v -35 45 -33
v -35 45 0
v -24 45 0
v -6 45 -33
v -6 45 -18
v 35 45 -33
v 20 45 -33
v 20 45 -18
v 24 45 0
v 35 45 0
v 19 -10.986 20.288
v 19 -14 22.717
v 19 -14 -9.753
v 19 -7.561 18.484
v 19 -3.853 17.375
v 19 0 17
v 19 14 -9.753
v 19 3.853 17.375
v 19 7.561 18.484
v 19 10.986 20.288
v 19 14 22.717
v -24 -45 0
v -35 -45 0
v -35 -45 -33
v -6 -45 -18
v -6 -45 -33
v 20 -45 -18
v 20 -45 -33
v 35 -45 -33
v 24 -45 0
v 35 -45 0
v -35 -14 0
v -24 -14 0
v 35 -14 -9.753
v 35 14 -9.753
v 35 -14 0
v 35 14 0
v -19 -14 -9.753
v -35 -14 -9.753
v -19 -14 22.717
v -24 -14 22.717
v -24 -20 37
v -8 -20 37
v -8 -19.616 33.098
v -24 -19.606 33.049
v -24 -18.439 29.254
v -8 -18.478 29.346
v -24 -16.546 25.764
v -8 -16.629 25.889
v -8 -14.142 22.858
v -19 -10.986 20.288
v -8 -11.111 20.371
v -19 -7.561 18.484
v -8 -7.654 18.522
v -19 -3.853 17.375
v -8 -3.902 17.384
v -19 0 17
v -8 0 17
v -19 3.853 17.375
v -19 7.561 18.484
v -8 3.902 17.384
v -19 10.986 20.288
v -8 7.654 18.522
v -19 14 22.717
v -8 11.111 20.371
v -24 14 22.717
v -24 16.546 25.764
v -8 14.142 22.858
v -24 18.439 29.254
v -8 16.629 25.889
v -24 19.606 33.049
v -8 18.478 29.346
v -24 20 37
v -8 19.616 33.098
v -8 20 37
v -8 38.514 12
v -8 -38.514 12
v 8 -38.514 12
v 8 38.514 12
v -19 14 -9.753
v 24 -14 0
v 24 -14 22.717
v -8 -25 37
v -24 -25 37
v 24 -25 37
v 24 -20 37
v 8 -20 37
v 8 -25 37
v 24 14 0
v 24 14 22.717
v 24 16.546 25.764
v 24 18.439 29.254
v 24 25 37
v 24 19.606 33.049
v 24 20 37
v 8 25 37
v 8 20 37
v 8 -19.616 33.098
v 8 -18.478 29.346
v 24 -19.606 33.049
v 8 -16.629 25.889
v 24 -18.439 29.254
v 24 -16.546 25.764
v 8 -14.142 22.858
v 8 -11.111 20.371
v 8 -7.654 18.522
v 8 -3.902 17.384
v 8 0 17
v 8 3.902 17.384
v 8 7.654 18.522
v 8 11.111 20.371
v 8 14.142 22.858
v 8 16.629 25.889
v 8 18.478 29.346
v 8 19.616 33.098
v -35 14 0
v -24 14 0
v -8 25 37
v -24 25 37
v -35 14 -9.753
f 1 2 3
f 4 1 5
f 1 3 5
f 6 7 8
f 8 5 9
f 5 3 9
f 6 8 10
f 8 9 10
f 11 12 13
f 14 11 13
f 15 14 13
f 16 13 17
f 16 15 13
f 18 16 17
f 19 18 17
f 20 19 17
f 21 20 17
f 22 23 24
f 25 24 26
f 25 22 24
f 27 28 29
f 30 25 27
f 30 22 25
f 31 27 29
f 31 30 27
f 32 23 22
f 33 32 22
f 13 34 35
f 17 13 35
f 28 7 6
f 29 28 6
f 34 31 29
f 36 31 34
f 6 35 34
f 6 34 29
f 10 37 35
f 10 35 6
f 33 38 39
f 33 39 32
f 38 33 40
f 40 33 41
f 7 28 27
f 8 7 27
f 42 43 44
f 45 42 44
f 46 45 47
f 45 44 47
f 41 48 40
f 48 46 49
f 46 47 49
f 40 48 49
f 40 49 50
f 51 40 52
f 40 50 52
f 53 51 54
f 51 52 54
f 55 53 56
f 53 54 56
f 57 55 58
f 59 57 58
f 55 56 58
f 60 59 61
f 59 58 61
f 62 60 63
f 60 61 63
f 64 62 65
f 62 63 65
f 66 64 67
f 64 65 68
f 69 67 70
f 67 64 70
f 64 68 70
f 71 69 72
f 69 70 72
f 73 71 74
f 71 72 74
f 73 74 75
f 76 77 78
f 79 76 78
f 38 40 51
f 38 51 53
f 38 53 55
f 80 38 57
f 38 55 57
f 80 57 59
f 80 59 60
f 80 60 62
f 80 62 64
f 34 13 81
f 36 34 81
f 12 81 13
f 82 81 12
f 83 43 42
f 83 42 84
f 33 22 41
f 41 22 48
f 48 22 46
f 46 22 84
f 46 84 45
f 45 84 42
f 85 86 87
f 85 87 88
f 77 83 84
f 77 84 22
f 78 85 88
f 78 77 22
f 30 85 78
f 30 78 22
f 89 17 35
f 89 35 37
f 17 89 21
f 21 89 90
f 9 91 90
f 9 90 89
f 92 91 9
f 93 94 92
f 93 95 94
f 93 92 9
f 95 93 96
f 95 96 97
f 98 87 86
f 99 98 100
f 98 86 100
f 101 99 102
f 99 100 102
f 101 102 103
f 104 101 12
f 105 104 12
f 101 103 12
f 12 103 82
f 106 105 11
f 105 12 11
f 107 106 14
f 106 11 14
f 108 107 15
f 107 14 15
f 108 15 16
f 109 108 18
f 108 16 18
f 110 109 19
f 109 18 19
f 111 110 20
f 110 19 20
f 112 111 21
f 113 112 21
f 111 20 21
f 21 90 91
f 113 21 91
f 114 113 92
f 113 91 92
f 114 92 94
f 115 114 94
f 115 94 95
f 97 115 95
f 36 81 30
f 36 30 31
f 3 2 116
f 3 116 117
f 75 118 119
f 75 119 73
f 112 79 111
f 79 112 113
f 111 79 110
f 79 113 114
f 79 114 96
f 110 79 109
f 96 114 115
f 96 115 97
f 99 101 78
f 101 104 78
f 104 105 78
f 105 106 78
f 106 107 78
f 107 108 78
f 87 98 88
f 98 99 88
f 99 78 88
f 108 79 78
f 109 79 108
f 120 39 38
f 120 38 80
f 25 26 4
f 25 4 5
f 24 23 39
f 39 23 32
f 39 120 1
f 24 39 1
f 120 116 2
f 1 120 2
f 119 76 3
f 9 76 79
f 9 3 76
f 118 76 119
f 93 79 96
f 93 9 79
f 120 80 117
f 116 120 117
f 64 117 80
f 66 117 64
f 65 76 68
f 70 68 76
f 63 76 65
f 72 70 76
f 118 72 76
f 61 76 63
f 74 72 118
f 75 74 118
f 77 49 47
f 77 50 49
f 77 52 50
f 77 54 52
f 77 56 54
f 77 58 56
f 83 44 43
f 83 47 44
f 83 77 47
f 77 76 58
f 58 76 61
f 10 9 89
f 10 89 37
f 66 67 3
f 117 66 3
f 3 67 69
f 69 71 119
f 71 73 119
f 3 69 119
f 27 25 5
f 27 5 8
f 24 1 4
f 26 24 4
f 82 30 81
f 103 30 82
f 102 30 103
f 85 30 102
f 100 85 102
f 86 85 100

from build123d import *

# Parameters (mm, degrees)
F1_W      = 70
F1_H      = 90
F2_DEPTH  = 33
F3_W      = 26
F3_H      = 15
F4_DEPTH  = 90.001
F5_DEPTH  = 24
F6_W      = 16
F6_H      = 25
F7_DEPTH  = 90.001
F8_R      = 20
F9_DEPTH  = 59.001
F10_W     = 28
F10_H     = 50
F11_DEPTH = 16


# Not quite as in the source:
# - a pattern or mirror of a feature is missing from the dataset's text; its kind, count and spacing are read off the source's solid


with BuildPart() as f2:
    # F1 (on Top) → F2 (new body)
    with BuildSketch(Plane.XY):
        Rectangle(F1_W, F1_H)
    extrude(amount=-F2_DEPTH)

    # F3 (on face) → F4 (cut, through all)
    with BuildSketch(Plane.XZ.offset(45)):
        with Locations((7, -25.5)):
            Rectangle(F3_W, F3_H)
    extrude(amount=-F4_DEPTH, mode=Mode.SUBTRACT)

    # F0 (on Right) → F5 (join, symmetric)
    with BuildSketch(Plane.YZ):
        Polygon((-25, 37), (-45, 0), (45, 0), (25, 37), align=None)
    extrude(amount=F5_DEPTH, both=True)

    # F6 (on face) → F7 (cut, through all)
    with BuildSketch(Plane.XZ.offset(45)):
        with Locations((0, 24.5)):
            Rectangle(F6_W, F6_H)
    extrude(amount=-F7_DEPTH, mode=Mode.SUBTRACT)

    # F8 (on face) → F9 (cut, through all)
    with BuildSketch(Plane.YZ.offset(24)):
        with Locations((0, 37)):
            Circle(F8_R)
    extrude(amount=-F9_DEPTH, mode=Mode.SUBTRACT)

    # F10 (on face) → F11 (cut)
    with BuildSketch(Plane.YZ.offset(35)):
        with Locations((0, 15.2474023402)):
            Rectangle(F10_W, F10_H)
    f11 = extrude(amount=-F11_DEPTH, mode=Mode.SUBTRACT)

    # F11_copies: F11 across plane
    add(f11.mirror(Plane(origin=(0, 0, 0), x_dir=(0, 0, -1), z_dir=(-1, 0, 0))), mode=Mode.SUBTRACT)


solid = f2.part
